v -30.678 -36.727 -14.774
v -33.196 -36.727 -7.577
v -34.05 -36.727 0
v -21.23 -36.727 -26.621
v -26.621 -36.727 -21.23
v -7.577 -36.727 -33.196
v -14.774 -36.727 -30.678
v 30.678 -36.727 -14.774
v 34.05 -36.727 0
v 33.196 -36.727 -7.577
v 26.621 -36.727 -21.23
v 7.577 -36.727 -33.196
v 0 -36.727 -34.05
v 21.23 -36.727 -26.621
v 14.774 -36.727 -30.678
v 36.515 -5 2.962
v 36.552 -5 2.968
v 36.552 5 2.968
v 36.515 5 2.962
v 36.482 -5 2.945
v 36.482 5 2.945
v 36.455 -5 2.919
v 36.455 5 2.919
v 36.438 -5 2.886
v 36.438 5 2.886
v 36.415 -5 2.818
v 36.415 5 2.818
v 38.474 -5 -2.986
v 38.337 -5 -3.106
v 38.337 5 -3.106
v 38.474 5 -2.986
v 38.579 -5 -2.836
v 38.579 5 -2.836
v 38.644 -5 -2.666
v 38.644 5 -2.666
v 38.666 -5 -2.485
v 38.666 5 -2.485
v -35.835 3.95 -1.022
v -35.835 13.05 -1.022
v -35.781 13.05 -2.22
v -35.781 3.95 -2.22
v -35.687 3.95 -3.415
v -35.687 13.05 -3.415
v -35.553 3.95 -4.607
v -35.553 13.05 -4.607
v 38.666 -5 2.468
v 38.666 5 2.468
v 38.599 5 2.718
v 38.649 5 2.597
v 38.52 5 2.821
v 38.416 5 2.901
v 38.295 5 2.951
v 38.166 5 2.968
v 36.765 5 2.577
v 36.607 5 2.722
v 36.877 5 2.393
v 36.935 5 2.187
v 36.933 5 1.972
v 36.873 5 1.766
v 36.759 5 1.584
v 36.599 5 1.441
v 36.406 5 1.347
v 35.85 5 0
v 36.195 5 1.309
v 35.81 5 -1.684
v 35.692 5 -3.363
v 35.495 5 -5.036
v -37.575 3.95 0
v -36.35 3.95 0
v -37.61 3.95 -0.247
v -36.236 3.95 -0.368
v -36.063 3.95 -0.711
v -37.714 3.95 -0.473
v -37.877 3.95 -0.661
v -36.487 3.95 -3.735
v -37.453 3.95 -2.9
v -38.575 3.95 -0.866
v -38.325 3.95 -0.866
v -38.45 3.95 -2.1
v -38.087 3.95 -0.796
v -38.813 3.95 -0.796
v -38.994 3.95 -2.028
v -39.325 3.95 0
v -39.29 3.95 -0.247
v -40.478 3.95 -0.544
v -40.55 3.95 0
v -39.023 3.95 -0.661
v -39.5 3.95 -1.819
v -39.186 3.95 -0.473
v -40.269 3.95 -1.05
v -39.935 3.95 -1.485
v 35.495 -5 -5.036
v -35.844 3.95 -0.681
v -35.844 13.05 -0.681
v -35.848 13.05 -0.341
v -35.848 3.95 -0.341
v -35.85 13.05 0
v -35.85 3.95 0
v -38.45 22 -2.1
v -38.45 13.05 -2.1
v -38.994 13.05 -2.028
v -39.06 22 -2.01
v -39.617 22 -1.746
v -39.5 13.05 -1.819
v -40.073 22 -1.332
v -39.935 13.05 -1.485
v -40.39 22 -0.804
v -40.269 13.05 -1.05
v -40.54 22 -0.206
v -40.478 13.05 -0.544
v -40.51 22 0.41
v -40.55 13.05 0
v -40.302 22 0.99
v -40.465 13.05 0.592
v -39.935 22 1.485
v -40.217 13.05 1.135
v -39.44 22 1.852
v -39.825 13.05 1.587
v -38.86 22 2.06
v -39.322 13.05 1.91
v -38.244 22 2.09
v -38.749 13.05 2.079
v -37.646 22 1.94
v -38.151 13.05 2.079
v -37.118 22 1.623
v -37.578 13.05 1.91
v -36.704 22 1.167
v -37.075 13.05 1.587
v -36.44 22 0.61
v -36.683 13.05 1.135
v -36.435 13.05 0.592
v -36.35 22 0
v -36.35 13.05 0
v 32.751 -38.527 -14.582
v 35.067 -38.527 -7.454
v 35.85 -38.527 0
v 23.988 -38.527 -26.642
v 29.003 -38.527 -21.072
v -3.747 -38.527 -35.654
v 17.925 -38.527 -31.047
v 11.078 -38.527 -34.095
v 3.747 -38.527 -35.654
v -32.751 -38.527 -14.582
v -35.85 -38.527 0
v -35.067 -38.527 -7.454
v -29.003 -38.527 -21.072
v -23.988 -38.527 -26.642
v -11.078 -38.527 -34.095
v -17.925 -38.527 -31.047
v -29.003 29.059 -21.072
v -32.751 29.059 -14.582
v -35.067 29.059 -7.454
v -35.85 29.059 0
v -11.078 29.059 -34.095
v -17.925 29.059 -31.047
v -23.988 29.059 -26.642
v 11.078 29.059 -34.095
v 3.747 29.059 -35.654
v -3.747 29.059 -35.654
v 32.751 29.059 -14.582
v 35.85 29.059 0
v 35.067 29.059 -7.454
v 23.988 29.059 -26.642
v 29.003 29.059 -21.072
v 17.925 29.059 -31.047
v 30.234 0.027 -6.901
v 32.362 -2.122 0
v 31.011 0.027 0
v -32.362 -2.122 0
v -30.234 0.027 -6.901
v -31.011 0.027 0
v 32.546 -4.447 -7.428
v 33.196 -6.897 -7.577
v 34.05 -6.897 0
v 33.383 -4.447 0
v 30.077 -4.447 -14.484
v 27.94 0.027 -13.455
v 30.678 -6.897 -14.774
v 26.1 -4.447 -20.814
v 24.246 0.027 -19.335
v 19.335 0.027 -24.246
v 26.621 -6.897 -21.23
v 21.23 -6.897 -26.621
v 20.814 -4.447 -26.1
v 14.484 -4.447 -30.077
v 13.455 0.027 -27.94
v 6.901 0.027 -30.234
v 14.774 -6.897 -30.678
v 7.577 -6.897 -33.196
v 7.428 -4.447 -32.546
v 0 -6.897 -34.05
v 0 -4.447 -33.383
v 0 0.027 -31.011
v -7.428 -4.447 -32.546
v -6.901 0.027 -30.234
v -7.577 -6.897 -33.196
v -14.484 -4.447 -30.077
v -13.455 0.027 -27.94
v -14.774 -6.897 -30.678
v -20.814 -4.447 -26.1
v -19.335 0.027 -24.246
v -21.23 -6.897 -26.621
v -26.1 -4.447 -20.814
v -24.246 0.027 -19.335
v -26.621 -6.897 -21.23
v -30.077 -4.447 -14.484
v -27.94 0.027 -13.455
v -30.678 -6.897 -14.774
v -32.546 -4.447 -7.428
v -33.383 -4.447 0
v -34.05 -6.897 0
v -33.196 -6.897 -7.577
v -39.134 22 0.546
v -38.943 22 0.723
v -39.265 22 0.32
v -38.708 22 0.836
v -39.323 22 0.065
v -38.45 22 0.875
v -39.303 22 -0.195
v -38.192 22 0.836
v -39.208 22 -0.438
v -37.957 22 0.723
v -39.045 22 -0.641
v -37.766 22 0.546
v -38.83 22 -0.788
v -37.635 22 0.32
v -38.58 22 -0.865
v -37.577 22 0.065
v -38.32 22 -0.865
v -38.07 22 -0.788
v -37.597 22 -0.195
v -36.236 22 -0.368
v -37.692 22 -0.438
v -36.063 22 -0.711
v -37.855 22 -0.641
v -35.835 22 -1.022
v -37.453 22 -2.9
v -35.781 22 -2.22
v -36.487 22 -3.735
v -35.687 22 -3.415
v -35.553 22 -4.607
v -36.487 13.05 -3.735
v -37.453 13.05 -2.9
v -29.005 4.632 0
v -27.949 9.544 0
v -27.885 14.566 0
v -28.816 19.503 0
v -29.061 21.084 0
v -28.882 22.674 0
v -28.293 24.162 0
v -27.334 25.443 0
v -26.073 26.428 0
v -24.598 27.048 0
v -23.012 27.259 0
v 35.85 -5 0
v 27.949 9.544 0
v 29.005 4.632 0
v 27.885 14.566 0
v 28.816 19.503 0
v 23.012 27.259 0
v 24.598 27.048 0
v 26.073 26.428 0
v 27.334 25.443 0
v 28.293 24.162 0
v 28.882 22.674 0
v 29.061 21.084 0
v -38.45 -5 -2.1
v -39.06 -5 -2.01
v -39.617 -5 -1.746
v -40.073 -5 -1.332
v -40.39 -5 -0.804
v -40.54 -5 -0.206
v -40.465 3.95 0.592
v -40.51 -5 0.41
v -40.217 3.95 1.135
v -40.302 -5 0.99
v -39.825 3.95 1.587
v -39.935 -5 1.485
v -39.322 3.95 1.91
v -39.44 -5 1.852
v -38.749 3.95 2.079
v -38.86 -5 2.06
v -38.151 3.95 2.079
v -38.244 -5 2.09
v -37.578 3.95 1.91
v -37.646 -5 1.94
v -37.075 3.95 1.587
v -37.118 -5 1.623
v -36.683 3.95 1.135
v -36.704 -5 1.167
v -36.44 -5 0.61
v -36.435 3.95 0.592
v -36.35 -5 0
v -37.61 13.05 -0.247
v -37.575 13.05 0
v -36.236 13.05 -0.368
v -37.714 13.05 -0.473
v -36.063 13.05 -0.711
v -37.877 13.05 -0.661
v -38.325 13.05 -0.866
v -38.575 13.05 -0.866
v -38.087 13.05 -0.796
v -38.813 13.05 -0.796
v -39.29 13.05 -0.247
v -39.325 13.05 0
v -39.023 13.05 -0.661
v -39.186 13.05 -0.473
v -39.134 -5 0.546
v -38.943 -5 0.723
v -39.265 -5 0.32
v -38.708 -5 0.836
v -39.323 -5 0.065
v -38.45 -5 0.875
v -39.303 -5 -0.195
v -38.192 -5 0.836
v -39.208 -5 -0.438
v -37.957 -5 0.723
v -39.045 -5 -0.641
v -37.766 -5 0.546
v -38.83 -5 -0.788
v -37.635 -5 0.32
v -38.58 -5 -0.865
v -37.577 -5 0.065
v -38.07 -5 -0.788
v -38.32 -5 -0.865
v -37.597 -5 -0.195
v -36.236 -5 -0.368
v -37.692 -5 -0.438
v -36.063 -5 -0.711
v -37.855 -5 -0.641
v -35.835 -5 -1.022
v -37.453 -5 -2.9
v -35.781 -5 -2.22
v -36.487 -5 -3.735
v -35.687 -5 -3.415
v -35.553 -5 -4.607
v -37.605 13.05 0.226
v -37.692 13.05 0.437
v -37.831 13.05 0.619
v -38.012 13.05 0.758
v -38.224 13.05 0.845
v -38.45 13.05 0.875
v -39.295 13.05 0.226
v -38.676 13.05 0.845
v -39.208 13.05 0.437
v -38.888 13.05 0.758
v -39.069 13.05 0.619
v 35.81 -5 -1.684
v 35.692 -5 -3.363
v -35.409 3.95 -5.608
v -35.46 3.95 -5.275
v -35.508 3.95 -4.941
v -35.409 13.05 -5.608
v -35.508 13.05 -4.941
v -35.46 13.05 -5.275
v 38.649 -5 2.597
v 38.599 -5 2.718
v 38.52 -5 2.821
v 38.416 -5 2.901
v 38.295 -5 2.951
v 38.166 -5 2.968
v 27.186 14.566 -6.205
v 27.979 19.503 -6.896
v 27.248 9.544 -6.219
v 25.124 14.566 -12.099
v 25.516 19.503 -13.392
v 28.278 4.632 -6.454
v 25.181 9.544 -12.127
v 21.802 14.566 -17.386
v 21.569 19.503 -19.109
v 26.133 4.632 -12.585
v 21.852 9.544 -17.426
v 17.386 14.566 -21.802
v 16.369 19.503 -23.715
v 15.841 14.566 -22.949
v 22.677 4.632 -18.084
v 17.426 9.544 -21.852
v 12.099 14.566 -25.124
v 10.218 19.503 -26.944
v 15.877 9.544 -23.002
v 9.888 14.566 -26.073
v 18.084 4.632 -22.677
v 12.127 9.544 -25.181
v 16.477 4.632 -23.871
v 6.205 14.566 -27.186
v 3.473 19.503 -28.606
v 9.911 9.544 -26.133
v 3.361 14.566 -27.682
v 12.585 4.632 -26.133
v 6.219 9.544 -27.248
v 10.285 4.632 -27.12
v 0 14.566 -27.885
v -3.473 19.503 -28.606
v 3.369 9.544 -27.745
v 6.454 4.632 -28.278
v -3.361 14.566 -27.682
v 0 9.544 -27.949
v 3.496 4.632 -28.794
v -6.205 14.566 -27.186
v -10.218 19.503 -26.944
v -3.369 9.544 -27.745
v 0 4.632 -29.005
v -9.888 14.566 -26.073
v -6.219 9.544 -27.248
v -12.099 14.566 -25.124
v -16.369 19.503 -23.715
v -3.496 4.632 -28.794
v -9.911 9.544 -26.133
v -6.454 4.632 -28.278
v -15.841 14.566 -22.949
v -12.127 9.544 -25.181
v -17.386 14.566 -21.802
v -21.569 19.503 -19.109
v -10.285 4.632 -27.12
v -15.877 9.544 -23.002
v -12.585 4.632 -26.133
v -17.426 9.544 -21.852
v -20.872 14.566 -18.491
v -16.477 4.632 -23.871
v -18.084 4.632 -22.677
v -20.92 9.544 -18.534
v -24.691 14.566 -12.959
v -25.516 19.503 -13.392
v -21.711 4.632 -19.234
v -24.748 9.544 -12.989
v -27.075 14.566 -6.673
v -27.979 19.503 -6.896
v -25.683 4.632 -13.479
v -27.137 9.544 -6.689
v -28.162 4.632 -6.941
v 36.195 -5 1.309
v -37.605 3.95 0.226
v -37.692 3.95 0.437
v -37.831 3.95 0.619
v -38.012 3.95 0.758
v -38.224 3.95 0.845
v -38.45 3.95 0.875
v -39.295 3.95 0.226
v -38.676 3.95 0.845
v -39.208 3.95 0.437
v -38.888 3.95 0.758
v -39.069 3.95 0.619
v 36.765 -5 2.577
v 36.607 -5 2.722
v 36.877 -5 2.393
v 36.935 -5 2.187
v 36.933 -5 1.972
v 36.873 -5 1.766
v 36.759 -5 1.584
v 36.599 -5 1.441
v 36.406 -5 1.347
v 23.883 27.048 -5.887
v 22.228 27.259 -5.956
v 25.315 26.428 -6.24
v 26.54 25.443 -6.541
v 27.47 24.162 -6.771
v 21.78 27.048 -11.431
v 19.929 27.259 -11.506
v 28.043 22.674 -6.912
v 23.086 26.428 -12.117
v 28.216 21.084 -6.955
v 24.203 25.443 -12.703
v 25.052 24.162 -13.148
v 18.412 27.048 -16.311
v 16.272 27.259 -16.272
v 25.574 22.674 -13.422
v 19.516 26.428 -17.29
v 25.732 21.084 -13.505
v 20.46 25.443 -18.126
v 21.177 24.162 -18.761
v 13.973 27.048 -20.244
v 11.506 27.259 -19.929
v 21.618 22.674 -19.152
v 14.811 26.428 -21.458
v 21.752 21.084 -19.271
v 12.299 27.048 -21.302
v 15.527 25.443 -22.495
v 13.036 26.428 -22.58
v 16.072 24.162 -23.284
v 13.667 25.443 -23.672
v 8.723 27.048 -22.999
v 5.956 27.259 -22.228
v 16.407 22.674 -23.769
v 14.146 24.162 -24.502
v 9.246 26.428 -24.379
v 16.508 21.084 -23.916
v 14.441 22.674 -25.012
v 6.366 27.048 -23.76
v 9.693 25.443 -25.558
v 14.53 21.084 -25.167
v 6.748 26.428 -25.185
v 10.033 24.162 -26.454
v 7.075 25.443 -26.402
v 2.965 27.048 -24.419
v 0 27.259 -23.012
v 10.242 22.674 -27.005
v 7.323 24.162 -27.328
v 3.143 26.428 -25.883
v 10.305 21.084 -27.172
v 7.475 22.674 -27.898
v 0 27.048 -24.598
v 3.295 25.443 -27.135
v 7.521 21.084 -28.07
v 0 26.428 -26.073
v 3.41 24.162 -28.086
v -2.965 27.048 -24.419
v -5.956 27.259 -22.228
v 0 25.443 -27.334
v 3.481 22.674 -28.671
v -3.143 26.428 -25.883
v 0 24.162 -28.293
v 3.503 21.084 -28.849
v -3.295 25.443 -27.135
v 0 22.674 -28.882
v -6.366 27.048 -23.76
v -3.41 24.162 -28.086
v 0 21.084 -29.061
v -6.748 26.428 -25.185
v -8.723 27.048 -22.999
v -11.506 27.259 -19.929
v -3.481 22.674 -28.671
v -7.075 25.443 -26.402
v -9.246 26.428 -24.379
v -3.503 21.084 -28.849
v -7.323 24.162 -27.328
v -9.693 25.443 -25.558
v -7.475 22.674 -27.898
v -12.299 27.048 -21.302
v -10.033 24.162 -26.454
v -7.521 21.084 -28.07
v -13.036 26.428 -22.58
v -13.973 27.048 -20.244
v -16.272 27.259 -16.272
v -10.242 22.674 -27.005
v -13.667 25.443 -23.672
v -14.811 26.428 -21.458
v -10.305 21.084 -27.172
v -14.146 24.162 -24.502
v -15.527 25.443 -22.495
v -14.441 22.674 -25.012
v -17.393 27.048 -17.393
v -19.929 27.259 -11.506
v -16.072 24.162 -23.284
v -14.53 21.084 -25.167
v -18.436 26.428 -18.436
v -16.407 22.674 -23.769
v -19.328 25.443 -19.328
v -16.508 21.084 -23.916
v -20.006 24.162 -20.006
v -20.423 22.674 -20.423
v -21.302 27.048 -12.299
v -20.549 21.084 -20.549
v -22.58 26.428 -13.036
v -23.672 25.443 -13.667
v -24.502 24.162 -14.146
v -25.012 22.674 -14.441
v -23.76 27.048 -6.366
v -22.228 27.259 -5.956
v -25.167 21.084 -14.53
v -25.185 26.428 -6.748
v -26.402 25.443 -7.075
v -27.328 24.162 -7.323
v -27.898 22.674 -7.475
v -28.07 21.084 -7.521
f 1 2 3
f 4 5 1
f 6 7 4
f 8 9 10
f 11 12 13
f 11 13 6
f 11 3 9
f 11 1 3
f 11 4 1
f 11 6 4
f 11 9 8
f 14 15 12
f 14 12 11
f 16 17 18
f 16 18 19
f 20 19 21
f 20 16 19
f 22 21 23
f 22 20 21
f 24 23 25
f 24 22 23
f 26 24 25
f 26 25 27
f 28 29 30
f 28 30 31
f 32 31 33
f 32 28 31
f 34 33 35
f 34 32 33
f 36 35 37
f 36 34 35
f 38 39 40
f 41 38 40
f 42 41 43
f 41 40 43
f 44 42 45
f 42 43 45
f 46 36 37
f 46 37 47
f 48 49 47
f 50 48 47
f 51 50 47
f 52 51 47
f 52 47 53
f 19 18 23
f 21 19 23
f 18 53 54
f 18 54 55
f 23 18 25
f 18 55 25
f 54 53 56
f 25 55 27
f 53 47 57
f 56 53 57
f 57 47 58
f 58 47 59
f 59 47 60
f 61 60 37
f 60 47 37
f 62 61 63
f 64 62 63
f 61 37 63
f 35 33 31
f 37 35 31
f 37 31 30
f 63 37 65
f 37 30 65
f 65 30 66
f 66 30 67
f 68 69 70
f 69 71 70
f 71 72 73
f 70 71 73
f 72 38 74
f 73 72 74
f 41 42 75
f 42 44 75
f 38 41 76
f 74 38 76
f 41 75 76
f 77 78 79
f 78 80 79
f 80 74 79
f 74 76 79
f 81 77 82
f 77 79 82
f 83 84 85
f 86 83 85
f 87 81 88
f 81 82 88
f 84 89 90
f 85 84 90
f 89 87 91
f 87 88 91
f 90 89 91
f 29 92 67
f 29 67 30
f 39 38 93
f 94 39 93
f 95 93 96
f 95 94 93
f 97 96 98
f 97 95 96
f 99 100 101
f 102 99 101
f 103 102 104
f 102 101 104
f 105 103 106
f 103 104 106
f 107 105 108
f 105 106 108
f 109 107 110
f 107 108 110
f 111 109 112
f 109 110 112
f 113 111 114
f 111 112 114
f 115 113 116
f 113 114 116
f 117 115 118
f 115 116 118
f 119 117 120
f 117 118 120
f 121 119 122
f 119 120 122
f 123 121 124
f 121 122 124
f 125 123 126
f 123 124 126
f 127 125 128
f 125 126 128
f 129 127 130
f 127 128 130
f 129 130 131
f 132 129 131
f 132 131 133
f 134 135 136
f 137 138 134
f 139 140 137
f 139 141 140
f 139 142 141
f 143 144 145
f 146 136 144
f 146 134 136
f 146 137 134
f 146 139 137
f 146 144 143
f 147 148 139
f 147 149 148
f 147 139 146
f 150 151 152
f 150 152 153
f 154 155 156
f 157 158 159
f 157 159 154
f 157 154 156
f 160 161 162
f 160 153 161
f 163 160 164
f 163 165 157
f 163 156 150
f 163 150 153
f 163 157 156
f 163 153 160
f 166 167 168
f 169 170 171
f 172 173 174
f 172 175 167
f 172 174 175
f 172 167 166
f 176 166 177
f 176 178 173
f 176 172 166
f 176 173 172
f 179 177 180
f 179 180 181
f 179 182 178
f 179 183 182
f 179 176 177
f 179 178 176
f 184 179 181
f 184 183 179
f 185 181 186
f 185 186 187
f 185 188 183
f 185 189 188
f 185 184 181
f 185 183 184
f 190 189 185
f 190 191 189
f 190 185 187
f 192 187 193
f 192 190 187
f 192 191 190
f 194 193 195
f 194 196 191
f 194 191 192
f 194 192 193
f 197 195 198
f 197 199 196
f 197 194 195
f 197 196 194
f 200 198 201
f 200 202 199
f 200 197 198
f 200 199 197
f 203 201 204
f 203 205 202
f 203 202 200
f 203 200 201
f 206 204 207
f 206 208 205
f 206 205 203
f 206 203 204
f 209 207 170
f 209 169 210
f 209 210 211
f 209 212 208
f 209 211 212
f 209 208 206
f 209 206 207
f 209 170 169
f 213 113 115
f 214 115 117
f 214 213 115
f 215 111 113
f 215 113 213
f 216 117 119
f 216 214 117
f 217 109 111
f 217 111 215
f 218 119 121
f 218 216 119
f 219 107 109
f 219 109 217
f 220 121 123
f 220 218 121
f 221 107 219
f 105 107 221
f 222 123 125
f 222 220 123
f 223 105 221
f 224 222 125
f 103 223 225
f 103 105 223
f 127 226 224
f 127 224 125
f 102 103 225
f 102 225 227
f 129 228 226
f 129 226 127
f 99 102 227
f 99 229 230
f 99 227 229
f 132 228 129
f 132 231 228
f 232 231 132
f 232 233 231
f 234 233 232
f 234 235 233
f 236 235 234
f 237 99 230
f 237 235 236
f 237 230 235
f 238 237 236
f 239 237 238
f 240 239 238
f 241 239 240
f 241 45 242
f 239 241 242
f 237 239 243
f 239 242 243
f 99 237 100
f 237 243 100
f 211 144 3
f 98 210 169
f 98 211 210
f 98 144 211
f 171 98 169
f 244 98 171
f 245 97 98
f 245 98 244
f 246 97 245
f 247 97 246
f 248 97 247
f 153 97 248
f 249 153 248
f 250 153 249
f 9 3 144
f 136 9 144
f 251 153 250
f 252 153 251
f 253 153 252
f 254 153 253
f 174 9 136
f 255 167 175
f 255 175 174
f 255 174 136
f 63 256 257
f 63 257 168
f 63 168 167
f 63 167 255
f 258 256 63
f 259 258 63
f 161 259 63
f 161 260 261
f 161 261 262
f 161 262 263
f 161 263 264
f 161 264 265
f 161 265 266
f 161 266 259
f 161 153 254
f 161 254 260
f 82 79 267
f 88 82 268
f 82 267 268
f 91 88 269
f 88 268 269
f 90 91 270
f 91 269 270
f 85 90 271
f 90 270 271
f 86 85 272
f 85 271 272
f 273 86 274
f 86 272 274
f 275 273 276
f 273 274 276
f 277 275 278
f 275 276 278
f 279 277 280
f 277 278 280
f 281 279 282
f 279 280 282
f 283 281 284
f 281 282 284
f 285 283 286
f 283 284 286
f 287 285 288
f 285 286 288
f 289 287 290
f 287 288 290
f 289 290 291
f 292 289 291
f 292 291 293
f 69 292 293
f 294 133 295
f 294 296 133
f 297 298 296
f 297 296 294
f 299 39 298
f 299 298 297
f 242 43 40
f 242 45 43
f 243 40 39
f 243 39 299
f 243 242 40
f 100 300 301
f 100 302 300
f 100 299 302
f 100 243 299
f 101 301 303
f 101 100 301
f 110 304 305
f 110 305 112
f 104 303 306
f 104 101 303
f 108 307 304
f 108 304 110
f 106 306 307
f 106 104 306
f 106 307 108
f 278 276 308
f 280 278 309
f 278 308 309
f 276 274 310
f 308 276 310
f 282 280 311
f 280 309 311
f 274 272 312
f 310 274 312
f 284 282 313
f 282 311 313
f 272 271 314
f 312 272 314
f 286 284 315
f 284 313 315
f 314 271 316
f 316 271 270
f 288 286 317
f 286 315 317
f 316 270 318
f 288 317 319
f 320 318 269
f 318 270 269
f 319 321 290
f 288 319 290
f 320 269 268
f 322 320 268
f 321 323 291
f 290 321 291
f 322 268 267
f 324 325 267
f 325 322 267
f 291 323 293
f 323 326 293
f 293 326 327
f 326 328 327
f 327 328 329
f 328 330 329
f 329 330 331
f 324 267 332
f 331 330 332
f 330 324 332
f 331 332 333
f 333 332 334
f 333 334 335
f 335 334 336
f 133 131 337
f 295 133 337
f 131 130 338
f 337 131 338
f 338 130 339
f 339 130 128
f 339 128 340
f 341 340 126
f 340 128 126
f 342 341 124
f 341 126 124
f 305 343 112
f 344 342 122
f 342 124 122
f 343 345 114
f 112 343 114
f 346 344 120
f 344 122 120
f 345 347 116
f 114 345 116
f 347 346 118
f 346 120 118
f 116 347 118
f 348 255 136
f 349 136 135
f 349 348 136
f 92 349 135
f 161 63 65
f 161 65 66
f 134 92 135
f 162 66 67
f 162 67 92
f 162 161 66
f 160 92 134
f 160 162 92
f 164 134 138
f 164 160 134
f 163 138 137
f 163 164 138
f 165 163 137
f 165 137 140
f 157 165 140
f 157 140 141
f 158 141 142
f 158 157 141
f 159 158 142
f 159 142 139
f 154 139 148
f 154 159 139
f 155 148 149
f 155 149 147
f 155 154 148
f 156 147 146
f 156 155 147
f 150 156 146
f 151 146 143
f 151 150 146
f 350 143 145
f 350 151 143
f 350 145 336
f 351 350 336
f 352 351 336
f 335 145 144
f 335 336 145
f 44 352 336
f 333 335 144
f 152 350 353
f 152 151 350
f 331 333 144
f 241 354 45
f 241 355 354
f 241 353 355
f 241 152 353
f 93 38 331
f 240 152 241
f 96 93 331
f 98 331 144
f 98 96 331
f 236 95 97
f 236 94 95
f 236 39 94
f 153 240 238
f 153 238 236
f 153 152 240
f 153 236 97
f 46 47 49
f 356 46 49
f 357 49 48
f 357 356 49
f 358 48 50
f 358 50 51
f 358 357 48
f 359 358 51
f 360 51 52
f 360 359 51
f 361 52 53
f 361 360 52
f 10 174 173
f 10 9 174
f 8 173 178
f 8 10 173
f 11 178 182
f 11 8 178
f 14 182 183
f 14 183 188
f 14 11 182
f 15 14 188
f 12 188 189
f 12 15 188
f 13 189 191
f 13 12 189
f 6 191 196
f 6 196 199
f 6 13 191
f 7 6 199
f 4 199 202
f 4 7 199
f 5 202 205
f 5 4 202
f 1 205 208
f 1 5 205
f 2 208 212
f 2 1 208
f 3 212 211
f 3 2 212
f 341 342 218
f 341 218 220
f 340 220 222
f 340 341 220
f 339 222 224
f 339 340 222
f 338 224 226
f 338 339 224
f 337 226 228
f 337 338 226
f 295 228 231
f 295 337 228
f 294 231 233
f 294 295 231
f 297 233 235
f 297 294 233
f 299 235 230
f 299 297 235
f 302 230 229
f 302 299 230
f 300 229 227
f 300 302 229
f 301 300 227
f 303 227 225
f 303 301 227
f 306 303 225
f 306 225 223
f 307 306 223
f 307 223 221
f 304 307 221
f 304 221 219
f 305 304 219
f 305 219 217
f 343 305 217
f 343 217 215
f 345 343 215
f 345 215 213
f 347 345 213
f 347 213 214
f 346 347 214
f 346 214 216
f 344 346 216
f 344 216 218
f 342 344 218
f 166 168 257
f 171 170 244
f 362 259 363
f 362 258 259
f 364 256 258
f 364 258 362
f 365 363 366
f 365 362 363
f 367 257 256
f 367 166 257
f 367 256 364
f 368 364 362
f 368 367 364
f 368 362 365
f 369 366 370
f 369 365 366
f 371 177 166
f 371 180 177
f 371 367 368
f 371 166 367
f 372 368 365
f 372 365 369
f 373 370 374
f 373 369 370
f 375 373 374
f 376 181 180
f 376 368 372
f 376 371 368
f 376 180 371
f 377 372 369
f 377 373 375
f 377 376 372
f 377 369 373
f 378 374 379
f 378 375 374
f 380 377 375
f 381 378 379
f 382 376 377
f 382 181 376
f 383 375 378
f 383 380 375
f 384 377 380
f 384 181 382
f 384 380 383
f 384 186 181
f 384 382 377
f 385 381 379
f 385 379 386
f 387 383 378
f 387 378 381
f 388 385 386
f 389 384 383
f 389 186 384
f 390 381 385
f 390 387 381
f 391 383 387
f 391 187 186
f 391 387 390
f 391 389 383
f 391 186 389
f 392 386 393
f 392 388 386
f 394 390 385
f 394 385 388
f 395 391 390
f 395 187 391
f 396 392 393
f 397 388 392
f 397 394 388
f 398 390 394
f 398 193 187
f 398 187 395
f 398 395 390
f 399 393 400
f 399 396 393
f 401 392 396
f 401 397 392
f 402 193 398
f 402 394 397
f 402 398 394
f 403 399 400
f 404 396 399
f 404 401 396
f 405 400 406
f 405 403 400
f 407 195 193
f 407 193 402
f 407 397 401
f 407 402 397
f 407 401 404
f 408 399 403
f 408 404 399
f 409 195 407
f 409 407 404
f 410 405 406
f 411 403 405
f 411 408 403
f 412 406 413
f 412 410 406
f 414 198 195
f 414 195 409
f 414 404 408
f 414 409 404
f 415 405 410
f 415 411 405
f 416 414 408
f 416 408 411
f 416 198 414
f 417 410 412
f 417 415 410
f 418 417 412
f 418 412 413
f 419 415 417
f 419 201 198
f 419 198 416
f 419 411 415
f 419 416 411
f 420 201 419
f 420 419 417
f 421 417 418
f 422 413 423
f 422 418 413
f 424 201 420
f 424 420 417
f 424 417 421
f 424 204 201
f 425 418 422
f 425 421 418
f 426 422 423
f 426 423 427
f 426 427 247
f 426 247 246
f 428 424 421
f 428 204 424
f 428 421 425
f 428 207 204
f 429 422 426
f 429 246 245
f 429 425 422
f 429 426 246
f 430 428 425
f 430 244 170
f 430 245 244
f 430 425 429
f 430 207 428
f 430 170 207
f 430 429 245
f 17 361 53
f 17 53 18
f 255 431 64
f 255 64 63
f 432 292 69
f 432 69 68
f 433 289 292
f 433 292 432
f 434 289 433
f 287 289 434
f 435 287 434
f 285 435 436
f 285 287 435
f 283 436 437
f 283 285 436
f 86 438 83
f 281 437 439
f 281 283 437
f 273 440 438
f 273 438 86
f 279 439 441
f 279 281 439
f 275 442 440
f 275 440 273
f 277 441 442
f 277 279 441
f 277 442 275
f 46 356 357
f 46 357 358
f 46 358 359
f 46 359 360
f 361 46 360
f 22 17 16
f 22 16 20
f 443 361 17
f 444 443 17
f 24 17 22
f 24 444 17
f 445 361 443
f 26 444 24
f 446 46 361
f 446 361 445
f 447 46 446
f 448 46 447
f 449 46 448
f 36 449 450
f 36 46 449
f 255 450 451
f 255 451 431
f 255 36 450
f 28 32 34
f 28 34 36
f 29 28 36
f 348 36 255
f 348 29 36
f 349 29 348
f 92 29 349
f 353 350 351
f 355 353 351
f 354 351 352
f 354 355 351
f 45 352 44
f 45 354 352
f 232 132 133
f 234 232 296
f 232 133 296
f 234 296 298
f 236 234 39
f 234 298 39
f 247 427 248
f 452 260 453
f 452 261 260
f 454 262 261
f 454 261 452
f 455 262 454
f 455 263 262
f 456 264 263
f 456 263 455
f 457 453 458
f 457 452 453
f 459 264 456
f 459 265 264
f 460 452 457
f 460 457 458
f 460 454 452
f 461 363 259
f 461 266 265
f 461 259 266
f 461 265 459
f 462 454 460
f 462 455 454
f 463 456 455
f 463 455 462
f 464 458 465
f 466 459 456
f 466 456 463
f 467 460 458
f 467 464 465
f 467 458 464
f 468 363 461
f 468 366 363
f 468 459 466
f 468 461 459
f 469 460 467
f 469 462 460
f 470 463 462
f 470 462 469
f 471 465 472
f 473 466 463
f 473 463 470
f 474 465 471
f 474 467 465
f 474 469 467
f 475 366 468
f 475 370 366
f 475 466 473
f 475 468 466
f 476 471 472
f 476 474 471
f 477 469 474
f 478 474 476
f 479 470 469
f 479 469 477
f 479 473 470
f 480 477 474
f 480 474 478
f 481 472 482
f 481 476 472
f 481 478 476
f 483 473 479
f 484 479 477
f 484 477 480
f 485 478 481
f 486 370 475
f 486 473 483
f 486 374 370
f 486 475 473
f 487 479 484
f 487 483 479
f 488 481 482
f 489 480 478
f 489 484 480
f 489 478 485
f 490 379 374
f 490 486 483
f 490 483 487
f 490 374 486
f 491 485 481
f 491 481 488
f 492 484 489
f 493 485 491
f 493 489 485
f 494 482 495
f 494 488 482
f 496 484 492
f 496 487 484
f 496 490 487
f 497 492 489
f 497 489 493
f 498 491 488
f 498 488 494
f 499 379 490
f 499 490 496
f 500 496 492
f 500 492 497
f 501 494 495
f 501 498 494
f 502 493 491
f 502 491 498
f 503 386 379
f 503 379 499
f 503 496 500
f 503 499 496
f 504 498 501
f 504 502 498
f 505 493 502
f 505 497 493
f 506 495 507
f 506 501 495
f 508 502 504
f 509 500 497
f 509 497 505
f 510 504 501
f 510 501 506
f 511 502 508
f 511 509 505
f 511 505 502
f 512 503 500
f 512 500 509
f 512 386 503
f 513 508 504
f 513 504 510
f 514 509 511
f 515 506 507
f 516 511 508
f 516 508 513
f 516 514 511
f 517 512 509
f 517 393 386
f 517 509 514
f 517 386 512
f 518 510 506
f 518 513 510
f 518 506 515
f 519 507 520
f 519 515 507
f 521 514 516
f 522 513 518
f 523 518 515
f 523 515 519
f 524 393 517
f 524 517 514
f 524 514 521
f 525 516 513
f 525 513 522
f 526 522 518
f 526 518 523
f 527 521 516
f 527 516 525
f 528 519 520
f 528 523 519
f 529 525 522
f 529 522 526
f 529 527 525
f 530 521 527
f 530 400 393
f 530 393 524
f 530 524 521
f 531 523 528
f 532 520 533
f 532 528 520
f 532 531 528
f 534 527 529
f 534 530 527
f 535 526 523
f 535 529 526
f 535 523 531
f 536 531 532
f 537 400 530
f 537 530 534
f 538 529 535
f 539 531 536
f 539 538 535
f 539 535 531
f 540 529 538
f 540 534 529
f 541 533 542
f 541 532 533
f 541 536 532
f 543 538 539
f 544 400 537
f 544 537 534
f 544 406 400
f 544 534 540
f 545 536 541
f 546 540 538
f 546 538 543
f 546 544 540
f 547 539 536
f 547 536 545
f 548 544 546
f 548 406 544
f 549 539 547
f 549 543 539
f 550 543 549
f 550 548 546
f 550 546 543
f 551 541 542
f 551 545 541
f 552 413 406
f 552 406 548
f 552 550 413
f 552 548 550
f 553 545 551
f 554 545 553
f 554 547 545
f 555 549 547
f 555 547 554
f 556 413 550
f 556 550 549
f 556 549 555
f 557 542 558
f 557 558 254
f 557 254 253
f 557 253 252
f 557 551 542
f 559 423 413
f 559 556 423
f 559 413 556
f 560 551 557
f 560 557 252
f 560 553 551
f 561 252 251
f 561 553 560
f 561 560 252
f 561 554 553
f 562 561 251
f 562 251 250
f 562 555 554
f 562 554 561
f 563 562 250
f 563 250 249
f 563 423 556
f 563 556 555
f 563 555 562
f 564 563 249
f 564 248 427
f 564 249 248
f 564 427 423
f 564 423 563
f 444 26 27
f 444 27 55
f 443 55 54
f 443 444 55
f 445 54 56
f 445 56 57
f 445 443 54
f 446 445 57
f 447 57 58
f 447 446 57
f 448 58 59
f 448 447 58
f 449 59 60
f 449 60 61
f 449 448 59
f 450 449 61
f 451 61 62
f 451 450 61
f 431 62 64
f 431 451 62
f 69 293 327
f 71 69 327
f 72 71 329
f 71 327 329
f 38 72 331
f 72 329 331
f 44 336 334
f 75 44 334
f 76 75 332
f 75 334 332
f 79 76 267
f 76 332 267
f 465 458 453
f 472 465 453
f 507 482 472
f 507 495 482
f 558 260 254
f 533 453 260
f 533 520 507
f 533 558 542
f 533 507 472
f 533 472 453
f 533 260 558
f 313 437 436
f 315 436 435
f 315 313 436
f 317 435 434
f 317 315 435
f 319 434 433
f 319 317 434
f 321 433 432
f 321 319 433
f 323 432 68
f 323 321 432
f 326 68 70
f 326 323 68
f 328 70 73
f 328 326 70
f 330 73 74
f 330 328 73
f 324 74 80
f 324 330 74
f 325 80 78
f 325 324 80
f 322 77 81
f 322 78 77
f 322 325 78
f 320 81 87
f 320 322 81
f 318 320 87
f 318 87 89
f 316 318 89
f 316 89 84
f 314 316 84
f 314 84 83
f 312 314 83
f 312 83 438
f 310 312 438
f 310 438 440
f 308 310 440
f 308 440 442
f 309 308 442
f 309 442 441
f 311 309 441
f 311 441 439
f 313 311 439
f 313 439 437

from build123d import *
from build123d.topology import SkipClean

# Parameters (mm, degrees)
REVOLVE1_ANGLE               = 180
BOSS_EXTRUDE1_DEPTH          = 22
BOSS_EXTRUDE1_DEPTH_BACK     = 5
SKETCH3_R                    = 0.875
BOSS_EXTRUDE2_DEPTH          = 5
BOSS_EXTRUDE2_DEPTH_BACK     = 5
SKETCH4_W                    = 4.7
SKETCH4_H                    = 9.1
CUT_REVOLVE1_ANGLE           = 9
CUT_REVOLVE1_OTHER_WAY_ANGLE = 9


with BuildPart() as part:
    # Sketch1 → Revolve1 (revolve)
    with BuildSketch(Plane.XY):
        with BuildLine():
            Line((0, 27.259159134), (23.011868121, 27.259159134))
            ThreePointArc((23.011868121, 27.259159134), (27.855738892, 24.833992365), (28.816239605, 19.502767713))
            ThreePointArc((28.816239605, 19.502767713), (27.949144344, 9.543519717), (31.011361688, 0.027149624))
            ThreePointArc((31.011361688, 0.027149624), (32.915416284, -3.265823742), (34.05, -6.89650099))
            Line((34.05, -6.89650099), (34.05, -36.726991211))
            Line((34.05, -36.726991211), (0, -36.726991211))
            Line((0, -36.726991211), (0, -38.526991211))
            Line((0, -38.526991211), (35.85, -38.526991211))
            Line((35.85, -38.526991211), (35.85, 29.059159134))
            Line((35.85, 29.059159134), (0, 29.059159134))
            Line((0, 29.059159134), (0, 27.259159134))
        make_face()
    revolve(axis=Axis((0, 0, 0), (0, 1, 0)), revolution_arc=REVOLVE1_ANGLE)

    # Sketch3 → Boss-Extrude1 (add, two sides: drawn at the far end of the back side and taken through both)
    with BuildSketch(Plane(origin=(0, 0, 0), x_dir=(1, 0, 0), z_dir=(0, 1, 0)).offset(-BOSS_EXTRUDE1_DEPTH_BACK)):
        with BuildLine():
            Line((-35.835435362, 1.02179861), (-35.66522342, 1.724252792))
            Line((-35.66522342, 1.724252792), (-35.552792373, 4.606674994))
            ThreePointArc((-35.552792373, 4.606674994), (-36.966498022, 3.313002301), (-38.45, 2.1))
            ThreePointArc((-38.45, 2.1), (-39.934924016, -1.484924465), (-36.35, 6.34e-07))
            ThreePointArc((-36.35, 6.34e-07), (-36.156829024, 0.54318529), (-35.835435362, 1.02179861))
        make_face()
        with Locations(Location((-38.45, 0, 0), (0, 0, 270))):
            Circle(SKETCH3_R, mode=Mode.SUBTRACT)
    extrude(amount=BOSS_EXTRUDE1_DEPTH + BOSS_EXTRUDE1_DEPTH_BACK)

    # Sketch5 → Boss-Extrude2 (add, two sides: drawn at the far end of the back side and taken through both)
    with BuildSketch(Plane(origin=(0, 0, 0), x_dir=(1, 0, 0), z_dir=(0, 1, 0)).offset(-BOSS_EXTRUDE2_DEPTH_BACK)):
        with BuildLine():
            Line((36.194622224, -1.309022975), (35.85, 0))
            ThreePointArc((35.85, 0), (35.761021608, 2.524249113), (35.494528112, 5.035968037))
            Line((35.494528112, 5.035968037), (38.337267345, 3.105755306))
            ThreePointArc((38.337267345, 3.105755306), (38.578712242, 2.836355157), (38.665960295, 2.485271326))
            Line((38.665960295, 2.485271326), (38.665960295, -2.467611774))
            ThreePointArc((38.665960295, -2.467611774), (38.519513686, -2.821165165), (38.165960295, -2.967611774))
            Line((38.165960295, -2.967611774), (37.169410283, -2.967611774))
            Line((37.169410283, -2.967611774), (36.551786147, -2.967611774))
            ThreePointArc((36.551786147, -2.967611774), (36.48188919, -2.945153638), (36.438154821, -2.886185362))
            Line((36.438154821, -2.886185362), (36.415143378, -2.818397505))
            ThreePointArc((36.415143378, -2.818397505), (36.933237669, -1.971906955), (36.194622224, -1.309022975))
        make_face()
    extrude(amount=BOSS_EXTRUDE2_DEPTH + BOSS_EXTRUDE2_DEPTH_BACK)

    # Sketch4 → Cut-Revolve1 (revolve, cut)
    with BuildSketch(Plane.XY):
        with Locations((-38.2, 8.5)):
            Rectangle(SKETCH4_W, SKETCH4_H)
    revolve(axis=Axis((0, 0, 0), (0, 1, 0)), revolution_arc=CUT_REVOLVE1_ANGLE, mode=Mode.SUBTRACT)

    # Sketch4 → Cut-Revolve1 other way (revolve, cut)
    with SkipClean():  # the faces are left unmerged after this step: merging them gives an invalid solid
        with BuildSketch(Plane.XY):
            with Locations((-38.2, 8.5)):
                Rectangle(SKETCH4_W, SKETCH4_H)
        revolve(axis=Axis((0, 0, 0), (0, -1, 0)), revolution_arc=CUT_REVOLVE1_OTHER_WAY_ANGLE, mode=Mode.SUBTRACT)


solid = part.part
